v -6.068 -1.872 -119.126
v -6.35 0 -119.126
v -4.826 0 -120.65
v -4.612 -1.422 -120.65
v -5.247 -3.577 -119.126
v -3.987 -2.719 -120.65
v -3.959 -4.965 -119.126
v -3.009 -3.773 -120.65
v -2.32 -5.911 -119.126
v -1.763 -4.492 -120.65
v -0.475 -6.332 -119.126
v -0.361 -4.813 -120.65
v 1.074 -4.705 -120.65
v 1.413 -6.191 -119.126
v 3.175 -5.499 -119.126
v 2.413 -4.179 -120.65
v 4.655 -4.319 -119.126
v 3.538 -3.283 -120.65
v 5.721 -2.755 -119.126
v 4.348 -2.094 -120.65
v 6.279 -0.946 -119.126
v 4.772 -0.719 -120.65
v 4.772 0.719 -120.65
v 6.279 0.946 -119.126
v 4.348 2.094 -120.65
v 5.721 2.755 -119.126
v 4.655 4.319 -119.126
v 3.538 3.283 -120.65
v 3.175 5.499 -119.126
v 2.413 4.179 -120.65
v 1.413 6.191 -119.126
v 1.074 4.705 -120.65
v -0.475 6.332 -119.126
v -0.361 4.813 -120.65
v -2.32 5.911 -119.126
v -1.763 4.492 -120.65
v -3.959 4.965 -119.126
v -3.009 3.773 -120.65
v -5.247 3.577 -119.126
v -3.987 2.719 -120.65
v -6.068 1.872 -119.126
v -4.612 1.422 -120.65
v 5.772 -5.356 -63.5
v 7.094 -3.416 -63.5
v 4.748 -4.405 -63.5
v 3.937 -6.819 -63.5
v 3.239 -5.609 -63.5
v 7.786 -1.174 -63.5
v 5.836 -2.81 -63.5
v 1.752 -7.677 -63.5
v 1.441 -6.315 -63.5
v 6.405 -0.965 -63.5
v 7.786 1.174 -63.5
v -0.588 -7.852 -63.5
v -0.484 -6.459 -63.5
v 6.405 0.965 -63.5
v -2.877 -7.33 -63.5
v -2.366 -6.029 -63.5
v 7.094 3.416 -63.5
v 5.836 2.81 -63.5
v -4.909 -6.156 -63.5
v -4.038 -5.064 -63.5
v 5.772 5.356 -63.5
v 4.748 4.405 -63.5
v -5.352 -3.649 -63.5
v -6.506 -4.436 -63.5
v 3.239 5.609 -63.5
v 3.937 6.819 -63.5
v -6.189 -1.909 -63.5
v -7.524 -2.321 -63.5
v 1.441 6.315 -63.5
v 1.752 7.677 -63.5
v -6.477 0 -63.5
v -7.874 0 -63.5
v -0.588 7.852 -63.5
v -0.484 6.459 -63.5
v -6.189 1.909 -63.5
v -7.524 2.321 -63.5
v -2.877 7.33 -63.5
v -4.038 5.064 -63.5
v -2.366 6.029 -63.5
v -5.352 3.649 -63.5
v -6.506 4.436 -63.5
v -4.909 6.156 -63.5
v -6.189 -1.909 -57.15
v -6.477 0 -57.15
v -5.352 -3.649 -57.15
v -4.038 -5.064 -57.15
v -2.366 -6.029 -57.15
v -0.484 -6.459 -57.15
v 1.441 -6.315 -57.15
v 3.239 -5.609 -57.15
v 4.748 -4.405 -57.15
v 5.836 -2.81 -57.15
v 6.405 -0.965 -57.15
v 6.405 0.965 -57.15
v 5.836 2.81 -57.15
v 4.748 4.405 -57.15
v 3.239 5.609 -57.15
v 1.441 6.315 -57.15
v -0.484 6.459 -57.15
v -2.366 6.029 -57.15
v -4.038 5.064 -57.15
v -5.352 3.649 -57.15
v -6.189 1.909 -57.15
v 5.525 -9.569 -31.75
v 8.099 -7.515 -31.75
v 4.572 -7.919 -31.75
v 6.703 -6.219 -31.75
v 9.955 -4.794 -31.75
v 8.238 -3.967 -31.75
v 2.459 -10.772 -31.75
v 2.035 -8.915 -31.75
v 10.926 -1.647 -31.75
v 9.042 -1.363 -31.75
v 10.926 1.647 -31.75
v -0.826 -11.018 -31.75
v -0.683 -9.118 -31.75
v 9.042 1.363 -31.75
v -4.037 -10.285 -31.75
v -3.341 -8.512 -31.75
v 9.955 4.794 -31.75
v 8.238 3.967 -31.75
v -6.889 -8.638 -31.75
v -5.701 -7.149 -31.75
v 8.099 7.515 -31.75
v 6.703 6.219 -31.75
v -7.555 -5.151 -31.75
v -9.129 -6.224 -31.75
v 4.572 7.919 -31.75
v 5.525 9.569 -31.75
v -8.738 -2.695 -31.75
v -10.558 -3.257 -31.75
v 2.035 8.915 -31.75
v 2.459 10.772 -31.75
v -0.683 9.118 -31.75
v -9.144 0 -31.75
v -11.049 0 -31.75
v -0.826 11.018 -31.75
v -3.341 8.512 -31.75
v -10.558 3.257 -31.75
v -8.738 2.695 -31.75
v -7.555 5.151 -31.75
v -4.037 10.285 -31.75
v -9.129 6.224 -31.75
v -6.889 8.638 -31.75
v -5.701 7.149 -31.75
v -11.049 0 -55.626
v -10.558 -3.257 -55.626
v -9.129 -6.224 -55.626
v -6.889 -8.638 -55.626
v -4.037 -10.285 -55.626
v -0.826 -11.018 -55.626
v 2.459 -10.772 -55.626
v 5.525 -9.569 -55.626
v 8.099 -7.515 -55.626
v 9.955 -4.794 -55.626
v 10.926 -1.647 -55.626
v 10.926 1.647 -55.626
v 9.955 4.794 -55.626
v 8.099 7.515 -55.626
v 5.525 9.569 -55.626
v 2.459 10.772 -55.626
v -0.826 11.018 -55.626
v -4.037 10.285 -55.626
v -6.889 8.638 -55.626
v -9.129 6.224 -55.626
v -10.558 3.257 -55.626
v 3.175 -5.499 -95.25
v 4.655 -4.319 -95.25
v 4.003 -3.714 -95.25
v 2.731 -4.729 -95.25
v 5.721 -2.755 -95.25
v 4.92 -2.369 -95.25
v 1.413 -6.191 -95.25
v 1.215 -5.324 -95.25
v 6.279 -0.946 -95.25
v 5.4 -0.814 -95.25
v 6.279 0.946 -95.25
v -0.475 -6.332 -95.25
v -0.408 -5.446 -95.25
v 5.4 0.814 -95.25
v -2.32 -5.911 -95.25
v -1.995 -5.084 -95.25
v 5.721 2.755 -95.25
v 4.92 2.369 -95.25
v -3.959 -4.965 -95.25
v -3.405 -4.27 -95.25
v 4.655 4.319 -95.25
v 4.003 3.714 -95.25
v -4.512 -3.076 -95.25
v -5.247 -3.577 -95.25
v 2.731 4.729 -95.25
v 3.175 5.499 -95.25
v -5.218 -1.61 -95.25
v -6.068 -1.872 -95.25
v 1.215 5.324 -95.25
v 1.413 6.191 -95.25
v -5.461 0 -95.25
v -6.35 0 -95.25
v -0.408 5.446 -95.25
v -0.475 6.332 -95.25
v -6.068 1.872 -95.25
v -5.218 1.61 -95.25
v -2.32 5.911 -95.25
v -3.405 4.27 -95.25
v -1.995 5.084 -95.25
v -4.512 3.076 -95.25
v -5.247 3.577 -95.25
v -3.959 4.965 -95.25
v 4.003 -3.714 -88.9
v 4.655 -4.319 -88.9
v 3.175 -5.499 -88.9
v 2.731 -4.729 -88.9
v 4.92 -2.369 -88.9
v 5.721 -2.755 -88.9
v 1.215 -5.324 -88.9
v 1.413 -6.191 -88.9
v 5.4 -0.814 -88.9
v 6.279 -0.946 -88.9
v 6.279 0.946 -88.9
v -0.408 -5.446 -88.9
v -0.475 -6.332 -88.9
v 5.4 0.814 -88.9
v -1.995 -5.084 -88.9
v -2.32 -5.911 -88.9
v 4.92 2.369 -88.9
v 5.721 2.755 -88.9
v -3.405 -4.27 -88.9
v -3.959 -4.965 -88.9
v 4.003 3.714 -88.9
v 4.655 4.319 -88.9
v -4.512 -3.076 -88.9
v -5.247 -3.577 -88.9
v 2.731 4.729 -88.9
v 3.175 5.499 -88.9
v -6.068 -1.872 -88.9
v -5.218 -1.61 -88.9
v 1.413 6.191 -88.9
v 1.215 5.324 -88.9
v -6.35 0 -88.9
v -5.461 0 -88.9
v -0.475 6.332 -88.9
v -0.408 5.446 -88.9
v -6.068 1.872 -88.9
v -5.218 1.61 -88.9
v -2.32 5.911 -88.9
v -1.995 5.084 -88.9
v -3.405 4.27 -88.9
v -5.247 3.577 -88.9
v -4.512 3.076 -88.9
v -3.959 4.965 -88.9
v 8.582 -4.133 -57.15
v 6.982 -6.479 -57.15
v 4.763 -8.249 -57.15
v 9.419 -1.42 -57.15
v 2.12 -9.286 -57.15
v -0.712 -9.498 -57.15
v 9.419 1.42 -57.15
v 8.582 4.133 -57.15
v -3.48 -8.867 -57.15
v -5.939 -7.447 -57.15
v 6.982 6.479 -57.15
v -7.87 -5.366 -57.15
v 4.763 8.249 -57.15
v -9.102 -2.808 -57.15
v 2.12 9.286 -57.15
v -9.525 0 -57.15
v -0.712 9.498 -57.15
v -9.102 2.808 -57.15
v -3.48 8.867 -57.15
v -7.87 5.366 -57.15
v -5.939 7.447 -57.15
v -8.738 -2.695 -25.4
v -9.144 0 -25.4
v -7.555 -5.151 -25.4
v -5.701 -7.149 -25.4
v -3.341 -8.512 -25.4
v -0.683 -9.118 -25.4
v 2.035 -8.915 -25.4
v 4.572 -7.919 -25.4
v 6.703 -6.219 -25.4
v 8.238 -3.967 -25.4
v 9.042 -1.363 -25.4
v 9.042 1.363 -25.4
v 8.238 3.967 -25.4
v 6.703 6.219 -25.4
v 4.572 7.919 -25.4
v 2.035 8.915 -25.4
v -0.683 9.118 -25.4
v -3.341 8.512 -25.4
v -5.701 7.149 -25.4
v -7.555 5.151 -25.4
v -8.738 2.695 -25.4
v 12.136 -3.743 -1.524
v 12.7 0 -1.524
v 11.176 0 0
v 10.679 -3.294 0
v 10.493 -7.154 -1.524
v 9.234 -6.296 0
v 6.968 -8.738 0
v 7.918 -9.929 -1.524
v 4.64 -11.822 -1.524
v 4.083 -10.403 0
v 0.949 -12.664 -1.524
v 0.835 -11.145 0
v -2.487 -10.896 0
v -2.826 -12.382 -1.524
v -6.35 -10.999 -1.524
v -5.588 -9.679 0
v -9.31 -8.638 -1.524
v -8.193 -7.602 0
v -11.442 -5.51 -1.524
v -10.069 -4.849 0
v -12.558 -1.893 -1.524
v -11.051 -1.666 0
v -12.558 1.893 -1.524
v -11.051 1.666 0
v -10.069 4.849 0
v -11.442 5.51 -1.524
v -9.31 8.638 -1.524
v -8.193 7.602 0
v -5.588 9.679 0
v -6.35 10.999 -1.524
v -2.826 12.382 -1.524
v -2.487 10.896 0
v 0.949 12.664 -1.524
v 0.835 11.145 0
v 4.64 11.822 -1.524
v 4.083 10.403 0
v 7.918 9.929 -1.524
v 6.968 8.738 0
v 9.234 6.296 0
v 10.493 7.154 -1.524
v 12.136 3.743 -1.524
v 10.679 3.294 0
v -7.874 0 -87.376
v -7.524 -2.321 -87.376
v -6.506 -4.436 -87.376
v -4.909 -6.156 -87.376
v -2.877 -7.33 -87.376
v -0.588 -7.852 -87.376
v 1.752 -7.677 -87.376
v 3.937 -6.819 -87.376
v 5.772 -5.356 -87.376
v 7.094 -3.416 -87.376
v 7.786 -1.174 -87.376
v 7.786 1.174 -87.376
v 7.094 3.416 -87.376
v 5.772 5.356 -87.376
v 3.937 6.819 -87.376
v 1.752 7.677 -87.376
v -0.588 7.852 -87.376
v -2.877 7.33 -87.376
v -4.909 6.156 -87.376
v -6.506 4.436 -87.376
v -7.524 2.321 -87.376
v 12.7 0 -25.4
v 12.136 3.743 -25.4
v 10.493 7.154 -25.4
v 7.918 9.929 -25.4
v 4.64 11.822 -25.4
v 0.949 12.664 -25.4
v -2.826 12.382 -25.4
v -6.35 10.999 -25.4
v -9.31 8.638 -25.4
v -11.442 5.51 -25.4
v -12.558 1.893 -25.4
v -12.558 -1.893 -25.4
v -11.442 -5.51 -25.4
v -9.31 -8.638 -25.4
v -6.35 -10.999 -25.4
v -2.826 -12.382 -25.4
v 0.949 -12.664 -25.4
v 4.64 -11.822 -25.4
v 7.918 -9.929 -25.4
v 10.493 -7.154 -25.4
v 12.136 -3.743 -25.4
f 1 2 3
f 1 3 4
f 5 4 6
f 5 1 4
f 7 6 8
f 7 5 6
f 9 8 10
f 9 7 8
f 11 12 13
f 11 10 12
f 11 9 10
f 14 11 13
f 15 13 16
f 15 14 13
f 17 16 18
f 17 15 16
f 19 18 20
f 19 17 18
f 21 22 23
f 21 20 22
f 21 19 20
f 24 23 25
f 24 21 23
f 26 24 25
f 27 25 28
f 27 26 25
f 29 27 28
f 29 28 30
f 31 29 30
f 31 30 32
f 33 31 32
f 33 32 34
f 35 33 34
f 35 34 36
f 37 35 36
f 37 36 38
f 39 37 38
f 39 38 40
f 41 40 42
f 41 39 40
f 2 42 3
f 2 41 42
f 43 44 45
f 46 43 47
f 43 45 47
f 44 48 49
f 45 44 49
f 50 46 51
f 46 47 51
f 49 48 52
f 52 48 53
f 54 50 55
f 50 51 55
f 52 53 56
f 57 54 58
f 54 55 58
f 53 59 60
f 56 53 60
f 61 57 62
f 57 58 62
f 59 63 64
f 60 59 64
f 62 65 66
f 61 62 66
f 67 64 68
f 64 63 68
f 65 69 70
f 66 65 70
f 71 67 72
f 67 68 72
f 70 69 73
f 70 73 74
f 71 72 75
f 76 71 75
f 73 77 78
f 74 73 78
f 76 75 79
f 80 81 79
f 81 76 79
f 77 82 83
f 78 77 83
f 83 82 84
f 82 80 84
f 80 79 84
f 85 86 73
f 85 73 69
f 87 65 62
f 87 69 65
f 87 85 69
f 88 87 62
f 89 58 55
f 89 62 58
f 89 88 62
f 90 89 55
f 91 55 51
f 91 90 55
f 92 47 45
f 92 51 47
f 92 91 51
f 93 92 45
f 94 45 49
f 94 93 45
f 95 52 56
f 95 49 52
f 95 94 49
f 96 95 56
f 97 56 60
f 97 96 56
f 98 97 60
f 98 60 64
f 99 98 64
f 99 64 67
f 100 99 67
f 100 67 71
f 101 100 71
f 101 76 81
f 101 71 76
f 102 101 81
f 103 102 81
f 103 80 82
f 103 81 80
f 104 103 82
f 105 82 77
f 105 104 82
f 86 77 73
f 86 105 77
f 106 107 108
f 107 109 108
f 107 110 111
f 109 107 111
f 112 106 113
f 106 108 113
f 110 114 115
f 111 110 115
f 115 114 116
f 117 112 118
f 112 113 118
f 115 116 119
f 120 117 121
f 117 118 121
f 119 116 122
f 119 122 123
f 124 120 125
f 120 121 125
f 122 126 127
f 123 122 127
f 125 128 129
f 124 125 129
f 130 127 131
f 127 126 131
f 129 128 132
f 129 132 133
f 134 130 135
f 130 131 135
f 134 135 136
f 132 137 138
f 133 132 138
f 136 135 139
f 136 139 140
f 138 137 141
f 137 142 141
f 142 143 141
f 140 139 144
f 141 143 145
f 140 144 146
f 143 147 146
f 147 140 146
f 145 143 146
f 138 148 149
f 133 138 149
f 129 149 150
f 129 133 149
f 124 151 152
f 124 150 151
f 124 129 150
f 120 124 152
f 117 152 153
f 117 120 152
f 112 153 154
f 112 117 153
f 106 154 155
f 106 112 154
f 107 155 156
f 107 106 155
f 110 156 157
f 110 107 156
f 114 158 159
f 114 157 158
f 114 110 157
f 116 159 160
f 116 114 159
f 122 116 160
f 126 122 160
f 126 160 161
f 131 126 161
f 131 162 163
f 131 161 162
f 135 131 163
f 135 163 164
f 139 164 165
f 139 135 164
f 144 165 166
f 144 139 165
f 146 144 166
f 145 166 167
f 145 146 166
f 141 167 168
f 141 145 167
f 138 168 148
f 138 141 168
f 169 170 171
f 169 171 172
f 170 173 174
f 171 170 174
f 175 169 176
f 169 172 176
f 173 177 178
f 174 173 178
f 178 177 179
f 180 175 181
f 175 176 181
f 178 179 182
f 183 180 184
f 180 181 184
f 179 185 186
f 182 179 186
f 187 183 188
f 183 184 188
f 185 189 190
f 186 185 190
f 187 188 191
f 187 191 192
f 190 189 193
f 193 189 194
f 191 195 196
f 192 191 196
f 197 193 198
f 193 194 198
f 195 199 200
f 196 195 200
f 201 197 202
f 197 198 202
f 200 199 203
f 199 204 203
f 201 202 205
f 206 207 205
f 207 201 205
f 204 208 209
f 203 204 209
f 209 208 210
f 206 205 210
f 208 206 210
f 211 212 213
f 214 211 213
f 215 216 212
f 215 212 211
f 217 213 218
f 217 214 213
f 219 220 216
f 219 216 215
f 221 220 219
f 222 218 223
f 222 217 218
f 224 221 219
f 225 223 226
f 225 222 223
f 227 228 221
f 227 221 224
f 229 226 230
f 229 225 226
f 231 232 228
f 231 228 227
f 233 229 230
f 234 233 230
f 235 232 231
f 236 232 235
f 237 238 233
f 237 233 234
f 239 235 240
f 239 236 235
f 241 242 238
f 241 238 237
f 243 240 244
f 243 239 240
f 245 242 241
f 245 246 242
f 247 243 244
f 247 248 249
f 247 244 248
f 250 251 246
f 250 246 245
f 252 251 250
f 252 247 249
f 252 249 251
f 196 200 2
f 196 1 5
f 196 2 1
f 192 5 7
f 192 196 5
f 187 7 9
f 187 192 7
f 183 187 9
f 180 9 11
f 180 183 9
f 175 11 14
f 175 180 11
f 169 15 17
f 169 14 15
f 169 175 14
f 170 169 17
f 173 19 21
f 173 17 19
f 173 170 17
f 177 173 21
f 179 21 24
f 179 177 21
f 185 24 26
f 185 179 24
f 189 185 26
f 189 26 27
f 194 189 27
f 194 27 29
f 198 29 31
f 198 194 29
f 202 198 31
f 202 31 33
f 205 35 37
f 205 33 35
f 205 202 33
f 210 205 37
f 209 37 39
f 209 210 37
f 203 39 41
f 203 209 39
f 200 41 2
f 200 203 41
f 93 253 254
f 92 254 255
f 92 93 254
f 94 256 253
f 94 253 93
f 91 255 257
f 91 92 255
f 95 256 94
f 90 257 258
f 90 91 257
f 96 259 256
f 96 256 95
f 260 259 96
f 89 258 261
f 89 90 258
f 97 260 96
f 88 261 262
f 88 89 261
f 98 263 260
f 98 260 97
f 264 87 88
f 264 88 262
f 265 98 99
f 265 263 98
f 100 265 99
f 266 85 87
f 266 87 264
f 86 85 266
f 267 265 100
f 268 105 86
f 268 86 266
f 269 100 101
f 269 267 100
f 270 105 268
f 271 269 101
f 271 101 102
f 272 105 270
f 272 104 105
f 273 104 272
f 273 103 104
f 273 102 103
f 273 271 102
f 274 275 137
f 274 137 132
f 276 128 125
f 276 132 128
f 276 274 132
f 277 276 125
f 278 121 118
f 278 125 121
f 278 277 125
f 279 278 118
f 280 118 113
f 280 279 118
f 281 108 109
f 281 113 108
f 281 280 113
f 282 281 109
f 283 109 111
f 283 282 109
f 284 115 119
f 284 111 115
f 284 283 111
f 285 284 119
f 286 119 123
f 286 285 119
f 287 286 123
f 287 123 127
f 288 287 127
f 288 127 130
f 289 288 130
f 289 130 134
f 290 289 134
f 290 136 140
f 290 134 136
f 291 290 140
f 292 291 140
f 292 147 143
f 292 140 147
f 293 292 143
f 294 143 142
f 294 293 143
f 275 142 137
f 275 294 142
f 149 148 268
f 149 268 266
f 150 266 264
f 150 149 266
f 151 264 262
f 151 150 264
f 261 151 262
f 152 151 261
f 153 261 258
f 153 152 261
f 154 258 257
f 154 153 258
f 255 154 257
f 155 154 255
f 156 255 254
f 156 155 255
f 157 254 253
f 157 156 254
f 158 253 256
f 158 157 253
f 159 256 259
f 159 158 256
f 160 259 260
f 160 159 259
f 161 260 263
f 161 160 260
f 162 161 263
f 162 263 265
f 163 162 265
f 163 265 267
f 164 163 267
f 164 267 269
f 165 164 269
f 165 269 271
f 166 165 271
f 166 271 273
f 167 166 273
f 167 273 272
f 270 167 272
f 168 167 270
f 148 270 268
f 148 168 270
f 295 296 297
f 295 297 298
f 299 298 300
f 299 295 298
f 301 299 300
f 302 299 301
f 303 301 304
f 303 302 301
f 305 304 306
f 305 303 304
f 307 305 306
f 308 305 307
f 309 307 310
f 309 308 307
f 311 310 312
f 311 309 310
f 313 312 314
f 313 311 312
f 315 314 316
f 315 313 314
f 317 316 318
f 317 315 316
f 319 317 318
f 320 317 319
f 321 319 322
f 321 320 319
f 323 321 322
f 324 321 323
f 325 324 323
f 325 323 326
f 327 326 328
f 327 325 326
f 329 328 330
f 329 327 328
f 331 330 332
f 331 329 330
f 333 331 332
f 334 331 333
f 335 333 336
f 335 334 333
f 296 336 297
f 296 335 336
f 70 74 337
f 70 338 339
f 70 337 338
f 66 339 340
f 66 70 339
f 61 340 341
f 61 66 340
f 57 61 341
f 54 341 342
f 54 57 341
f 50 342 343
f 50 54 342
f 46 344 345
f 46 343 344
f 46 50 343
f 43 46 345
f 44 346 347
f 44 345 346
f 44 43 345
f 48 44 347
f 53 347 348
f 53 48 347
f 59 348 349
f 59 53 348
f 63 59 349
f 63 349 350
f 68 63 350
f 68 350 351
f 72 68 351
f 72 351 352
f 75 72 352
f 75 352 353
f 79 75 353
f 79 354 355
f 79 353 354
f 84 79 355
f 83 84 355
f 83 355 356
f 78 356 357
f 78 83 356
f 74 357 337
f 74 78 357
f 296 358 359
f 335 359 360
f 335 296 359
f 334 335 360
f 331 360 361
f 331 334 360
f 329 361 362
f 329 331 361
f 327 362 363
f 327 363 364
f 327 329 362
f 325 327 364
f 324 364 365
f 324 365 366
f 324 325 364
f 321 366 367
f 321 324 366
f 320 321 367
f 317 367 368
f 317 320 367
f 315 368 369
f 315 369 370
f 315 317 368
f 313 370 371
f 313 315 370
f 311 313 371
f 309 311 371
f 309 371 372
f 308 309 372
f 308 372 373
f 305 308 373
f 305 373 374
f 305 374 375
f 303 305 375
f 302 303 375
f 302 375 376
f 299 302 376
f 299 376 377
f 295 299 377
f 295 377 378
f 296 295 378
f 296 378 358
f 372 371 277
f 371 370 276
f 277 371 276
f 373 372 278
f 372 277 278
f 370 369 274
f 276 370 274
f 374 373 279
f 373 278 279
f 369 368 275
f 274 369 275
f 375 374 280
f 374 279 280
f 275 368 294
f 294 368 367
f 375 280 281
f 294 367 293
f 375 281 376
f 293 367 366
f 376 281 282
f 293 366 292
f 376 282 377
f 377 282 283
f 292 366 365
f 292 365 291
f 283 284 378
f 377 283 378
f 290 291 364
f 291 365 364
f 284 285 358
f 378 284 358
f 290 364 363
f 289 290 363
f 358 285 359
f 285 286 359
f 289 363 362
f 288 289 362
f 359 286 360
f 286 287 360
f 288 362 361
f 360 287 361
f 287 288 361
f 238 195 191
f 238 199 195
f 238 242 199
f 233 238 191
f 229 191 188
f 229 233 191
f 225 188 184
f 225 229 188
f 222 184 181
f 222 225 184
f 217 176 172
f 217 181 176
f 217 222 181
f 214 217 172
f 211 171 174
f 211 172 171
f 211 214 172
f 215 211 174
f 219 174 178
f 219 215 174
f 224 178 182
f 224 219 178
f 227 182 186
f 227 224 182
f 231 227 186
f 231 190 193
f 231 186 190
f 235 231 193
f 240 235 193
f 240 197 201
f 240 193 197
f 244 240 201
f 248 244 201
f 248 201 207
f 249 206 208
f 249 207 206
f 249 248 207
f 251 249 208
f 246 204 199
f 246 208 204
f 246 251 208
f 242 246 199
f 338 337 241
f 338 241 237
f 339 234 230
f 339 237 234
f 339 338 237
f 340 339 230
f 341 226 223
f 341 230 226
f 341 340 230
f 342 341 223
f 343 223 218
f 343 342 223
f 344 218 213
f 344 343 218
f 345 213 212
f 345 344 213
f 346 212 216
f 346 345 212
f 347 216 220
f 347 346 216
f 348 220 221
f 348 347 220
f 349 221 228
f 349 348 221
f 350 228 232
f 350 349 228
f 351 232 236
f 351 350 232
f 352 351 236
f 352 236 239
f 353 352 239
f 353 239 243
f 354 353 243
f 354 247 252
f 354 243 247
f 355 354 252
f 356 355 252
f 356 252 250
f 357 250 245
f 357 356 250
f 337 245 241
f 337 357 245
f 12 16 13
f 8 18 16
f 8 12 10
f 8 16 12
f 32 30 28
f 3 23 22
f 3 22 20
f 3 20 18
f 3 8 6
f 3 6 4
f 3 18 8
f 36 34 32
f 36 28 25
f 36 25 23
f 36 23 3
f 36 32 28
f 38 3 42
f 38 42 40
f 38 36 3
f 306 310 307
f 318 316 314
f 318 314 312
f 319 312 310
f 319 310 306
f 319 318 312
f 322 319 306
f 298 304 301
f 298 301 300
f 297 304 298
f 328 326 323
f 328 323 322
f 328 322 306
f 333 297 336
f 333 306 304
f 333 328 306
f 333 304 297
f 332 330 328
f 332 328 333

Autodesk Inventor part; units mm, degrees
ref_plane "YZ Plane" through (0, 0, 0) normal (1, 0, 0) x (0, 1, 0)
ref_plane "XZ Plane" through (0, 0, 0) normal (0, 1, 0) x (-1, 0, 0)
ref_plane "XY Plane" through (0, 0, 0) normal (0, 0, 1) x (1, 0, 0)
sketch "Sketch2" plane through (0, 0, 0) normal (0, 0, 1) x (1, 0, 0)
  circle A0 centre (0, 0) radius 12.7
  dimension "d4" = 25.4
extrude "Extrusion2" add sketch "Sketch2" against normal blind 25.4
chamfer "Chamfer1" distance 1.524 angle 45 1 edges at (-12.7, 0, 0) measured on face at (-3.6254, -0.9542, 0)
sketch "Sketch3" plane through (0, 0, -25.4) normal (0, 0, -1) x (-1, 0, 0)
  circle A0 centre (0, 0) radius 9.144
  dimension "d10" = 18.288
extrude "Extrusion3" add sketch "Sketch3" along normal blind 6.35
sketch "Sketch4" plane through (0, 0, -31.75) normal (0, 0, -1) x (-1, 0, 0)
  circle A0 centre (0, 0) radius 11.049
  dimension "d13" = 22.098
extrude "Extrusion4" add sketch "Sketch4" along normal blind 25.4
thread "Thread1" size "7/8-9 UNC" class "2A" standard "ANSI Unified Screw Threads" full length
chamfer "Chamfer2" distance 1.524 angle 45 1 edges at (11.049, 0, -57.15) measured on face at (-0.3422, 2.8186, -57.15)
sketch "Sketch5" plane through (0, 0, -57.15) normal (0, 0, -1) x (-1, 0, 0)
  circle A0 centre (0, 0) radius 6.477
  dimension "d21" = 12.954
extrude "Extrusion5" add sketch "Sketch5" along normal blind 6.35
sketch "Sketch6" plane through (0, 0, -63.5) normal (0, 0, -1) x (-1, 0, 0)
  circle A0 centre (0, 0) radius 7.874
  dimension "d24" = 15.748
extrude "Extrusion6" add sketch "Sketch6" along normal blind 25.4
thread "Thread2" size "5/8-11 UNC" class "2A" standard "ANSI Unified Screw Threads" full length
chamfer "Chamfer3" distance 1.524 angle 45 1 edges at (7.874, 0, -88.9) measured on face at (-0.2439, 2.0086, -88.9)
sketch "Sketch7" plane through (0, 0, -88.9) normal (0, 0, -1) x (-1, 0, 0)
  circle A0 centre (0, 0) radius 5.461
  dimension "d32" = 10.922
extrude "Extrusion7" add sketch "Sketch7" along normal blind 6.35
sketch "Sketch8" plane through (0, 0, -95.25) normal (0, 0, -1) x (-1, 0, 0)
  circle A0 centre (0, 0) radius 6.35
  dimension "d35" = 12.7
extrude "Extrusion8" add sketch "Sketch8" along normal blind 25.4
thread "Thread3" size "1/2-20 UNF" class "2A" standard "ANSI Unified Screw Threads" full length
chamfer "Chamfer4" distance 1.524 angle 45 1 edges at (6.35, 0, -120.65) measured on face at (1.8127, -0.4771, -120.65)
properties part number "13_3"
